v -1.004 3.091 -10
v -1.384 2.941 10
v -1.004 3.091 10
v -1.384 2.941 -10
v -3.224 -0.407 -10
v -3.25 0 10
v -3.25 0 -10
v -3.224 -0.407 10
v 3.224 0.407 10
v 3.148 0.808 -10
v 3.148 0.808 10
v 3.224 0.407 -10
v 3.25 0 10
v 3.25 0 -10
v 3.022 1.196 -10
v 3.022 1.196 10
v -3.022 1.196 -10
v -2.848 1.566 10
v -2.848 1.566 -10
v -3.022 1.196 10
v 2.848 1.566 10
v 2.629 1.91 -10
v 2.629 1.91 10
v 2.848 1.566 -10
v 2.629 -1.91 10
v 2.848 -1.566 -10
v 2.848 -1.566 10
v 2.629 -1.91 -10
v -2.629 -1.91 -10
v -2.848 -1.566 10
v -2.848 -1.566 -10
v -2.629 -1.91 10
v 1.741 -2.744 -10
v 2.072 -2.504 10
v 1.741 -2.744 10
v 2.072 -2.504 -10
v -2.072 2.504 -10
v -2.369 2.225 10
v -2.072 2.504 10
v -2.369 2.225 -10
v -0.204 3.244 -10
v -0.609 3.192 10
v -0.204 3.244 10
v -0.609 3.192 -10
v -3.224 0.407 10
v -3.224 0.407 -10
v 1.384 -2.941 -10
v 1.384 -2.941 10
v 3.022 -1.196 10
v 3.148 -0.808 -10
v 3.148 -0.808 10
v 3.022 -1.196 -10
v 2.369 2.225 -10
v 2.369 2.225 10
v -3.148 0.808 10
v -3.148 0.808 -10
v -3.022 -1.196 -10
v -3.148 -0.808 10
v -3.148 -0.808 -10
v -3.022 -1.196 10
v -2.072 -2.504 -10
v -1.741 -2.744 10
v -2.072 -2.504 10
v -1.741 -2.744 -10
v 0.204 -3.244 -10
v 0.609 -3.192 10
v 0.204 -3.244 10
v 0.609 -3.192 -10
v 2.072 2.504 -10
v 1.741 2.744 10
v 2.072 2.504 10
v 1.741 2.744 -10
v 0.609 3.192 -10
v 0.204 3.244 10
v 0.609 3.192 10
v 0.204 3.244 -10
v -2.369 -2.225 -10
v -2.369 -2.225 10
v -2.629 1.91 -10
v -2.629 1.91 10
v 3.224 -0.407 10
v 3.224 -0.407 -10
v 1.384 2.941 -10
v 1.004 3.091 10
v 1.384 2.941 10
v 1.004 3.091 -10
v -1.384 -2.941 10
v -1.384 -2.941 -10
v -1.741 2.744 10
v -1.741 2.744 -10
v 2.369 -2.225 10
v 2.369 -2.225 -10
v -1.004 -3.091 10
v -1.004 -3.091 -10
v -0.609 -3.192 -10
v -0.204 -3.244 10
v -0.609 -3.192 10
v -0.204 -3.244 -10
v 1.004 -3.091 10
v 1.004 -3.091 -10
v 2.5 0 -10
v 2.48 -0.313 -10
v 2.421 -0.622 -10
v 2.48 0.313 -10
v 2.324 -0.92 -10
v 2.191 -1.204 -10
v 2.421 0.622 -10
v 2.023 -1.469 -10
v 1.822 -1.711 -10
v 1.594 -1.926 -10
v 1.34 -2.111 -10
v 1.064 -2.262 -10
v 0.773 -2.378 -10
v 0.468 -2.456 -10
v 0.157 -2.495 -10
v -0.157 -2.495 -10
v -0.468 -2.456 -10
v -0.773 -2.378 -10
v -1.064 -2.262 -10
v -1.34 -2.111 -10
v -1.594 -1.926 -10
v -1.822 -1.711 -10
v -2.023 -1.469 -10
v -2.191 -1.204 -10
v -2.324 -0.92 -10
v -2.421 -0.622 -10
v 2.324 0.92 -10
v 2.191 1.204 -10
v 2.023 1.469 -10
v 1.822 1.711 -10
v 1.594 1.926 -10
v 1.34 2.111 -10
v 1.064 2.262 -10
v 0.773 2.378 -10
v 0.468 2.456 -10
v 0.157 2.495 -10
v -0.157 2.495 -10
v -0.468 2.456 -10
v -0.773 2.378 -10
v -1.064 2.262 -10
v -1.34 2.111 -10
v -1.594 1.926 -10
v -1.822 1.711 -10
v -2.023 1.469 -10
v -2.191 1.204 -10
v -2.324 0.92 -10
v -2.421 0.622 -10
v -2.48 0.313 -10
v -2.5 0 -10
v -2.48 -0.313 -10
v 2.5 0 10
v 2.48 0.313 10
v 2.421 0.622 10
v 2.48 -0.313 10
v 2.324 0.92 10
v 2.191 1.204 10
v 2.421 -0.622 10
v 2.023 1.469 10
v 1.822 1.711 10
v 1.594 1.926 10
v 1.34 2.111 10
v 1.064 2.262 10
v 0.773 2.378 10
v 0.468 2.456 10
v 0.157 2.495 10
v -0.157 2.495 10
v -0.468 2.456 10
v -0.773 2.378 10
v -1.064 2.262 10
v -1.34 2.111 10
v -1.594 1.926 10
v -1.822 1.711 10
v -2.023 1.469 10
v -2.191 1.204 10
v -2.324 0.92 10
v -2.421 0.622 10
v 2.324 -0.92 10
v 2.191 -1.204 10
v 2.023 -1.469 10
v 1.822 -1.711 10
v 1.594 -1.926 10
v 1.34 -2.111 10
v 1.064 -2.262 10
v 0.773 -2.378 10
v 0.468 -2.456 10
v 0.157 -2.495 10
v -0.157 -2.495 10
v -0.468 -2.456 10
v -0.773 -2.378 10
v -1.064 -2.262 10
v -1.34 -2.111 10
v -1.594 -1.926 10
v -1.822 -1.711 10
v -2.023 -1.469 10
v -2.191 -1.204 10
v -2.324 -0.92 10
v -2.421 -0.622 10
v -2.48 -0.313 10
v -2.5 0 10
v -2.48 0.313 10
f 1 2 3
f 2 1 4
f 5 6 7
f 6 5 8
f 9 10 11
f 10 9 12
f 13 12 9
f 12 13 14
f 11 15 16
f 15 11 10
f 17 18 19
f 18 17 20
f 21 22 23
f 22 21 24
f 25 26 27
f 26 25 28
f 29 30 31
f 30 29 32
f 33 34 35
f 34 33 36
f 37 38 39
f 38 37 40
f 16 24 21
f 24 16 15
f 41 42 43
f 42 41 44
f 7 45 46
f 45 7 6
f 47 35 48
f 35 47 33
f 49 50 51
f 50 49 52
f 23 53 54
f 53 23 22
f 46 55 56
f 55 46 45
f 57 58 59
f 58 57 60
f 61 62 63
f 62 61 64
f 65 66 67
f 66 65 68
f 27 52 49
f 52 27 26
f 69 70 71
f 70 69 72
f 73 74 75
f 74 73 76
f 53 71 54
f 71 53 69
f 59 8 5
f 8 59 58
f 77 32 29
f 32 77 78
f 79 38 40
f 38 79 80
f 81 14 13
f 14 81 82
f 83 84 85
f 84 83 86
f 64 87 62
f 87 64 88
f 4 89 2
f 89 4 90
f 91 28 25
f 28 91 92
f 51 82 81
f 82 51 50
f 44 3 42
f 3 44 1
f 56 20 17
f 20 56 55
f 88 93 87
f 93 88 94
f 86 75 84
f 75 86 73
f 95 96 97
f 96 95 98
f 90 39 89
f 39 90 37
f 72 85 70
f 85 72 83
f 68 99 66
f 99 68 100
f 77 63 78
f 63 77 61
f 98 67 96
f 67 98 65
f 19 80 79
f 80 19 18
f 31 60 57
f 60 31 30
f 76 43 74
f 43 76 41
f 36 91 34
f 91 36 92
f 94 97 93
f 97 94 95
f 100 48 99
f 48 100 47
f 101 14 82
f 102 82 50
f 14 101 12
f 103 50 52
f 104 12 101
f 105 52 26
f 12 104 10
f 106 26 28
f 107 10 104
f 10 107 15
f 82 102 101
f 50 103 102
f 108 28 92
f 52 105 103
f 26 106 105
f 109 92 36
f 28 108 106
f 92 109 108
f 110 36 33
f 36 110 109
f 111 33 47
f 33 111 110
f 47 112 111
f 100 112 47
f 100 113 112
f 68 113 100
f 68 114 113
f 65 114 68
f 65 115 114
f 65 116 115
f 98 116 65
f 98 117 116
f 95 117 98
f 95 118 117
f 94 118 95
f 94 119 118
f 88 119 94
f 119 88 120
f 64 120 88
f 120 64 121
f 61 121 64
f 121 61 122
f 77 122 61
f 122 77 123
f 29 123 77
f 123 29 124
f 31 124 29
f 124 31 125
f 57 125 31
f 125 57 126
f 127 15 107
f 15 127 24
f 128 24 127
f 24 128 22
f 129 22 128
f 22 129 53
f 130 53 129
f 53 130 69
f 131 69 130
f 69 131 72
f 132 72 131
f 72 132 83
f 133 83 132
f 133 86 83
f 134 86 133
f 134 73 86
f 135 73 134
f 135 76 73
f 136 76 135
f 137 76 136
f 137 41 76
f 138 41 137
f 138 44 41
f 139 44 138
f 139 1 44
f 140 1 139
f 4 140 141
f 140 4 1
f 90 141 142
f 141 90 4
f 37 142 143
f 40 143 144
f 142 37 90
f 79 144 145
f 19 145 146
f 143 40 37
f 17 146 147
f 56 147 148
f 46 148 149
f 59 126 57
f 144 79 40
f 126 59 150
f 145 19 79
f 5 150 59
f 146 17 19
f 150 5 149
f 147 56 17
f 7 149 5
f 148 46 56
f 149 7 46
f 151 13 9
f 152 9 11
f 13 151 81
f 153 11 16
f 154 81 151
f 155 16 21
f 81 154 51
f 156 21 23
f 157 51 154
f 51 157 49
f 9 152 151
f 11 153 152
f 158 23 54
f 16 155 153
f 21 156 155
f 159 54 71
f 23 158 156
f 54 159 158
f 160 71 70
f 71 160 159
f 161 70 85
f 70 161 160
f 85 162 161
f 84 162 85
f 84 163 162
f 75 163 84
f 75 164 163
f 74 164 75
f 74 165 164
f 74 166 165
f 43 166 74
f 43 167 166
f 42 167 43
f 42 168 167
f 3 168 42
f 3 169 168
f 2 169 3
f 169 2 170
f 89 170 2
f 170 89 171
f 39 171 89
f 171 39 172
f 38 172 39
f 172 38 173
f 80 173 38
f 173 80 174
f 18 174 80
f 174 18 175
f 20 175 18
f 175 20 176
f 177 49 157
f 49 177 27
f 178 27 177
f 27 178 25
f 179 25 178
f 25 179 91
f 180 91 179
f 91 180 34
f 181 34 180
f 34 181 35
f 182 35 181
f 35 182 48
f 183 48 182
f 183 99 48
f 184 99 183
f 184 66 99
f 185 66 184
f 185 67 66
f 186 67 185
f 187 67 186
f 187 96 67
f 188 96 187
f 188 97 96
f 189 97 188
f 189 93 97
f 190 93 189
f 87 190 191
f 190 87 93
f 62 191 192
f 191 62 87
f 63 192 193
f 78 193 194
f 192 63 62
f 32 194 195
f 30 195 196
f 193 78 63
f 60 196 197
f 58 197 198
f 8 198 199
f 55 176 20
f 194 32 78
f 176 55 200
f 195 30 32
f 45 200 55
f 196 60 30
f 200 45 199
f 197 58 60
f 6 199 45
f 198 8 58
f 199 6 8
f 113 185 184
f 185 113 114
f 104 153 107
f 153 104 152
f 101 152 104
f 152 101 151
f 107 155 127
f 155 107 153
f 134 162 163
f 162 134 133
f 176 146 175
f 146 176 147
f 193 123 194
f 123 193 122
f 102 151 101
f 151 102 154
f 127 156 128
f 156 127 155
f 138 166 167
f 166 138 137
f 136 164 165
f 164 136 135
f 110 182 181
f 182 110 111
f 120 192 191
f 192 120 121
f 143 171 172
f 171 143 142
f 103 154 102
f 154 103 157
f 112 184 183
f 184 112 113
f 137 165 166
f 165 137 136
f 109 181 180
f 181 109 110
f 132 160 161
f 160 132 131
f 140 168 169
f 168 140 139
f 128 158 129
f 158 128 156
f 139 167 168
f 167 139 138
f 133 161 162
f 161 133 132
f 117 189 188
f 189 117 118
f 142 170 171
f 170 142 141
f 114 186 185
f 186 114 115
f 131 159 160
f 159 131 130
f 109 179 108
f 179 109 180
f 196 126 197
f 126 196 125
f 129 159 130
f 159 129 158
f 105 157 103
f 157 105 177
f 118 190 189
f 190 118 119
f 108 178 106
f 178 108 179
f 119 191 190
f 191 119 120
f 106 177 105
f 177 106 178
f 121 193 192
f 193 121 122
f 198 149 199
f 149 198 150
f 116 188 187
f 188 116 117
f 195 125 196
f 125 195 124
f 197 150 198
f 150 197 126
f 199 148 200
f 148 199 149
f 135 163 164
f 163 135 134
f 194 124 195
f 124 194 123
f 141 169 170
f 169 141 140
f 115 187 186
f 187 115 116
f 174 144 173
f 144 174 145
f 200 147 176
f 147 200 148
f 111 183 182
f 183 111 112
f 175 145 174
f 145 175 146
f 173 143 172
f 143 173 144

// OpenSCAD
$fn = 50;


difference() {
	union() {
		translate(v = [0, 0, -10.0000000000]) {
			cylinder(h = 20, r = 3.2500000000);
		}
	}
	union() {
		translate(v = [0, 0, -100.0000000000]) {
			cylinder(h = 200, r = 2.5000000000);
		}
	}
}
